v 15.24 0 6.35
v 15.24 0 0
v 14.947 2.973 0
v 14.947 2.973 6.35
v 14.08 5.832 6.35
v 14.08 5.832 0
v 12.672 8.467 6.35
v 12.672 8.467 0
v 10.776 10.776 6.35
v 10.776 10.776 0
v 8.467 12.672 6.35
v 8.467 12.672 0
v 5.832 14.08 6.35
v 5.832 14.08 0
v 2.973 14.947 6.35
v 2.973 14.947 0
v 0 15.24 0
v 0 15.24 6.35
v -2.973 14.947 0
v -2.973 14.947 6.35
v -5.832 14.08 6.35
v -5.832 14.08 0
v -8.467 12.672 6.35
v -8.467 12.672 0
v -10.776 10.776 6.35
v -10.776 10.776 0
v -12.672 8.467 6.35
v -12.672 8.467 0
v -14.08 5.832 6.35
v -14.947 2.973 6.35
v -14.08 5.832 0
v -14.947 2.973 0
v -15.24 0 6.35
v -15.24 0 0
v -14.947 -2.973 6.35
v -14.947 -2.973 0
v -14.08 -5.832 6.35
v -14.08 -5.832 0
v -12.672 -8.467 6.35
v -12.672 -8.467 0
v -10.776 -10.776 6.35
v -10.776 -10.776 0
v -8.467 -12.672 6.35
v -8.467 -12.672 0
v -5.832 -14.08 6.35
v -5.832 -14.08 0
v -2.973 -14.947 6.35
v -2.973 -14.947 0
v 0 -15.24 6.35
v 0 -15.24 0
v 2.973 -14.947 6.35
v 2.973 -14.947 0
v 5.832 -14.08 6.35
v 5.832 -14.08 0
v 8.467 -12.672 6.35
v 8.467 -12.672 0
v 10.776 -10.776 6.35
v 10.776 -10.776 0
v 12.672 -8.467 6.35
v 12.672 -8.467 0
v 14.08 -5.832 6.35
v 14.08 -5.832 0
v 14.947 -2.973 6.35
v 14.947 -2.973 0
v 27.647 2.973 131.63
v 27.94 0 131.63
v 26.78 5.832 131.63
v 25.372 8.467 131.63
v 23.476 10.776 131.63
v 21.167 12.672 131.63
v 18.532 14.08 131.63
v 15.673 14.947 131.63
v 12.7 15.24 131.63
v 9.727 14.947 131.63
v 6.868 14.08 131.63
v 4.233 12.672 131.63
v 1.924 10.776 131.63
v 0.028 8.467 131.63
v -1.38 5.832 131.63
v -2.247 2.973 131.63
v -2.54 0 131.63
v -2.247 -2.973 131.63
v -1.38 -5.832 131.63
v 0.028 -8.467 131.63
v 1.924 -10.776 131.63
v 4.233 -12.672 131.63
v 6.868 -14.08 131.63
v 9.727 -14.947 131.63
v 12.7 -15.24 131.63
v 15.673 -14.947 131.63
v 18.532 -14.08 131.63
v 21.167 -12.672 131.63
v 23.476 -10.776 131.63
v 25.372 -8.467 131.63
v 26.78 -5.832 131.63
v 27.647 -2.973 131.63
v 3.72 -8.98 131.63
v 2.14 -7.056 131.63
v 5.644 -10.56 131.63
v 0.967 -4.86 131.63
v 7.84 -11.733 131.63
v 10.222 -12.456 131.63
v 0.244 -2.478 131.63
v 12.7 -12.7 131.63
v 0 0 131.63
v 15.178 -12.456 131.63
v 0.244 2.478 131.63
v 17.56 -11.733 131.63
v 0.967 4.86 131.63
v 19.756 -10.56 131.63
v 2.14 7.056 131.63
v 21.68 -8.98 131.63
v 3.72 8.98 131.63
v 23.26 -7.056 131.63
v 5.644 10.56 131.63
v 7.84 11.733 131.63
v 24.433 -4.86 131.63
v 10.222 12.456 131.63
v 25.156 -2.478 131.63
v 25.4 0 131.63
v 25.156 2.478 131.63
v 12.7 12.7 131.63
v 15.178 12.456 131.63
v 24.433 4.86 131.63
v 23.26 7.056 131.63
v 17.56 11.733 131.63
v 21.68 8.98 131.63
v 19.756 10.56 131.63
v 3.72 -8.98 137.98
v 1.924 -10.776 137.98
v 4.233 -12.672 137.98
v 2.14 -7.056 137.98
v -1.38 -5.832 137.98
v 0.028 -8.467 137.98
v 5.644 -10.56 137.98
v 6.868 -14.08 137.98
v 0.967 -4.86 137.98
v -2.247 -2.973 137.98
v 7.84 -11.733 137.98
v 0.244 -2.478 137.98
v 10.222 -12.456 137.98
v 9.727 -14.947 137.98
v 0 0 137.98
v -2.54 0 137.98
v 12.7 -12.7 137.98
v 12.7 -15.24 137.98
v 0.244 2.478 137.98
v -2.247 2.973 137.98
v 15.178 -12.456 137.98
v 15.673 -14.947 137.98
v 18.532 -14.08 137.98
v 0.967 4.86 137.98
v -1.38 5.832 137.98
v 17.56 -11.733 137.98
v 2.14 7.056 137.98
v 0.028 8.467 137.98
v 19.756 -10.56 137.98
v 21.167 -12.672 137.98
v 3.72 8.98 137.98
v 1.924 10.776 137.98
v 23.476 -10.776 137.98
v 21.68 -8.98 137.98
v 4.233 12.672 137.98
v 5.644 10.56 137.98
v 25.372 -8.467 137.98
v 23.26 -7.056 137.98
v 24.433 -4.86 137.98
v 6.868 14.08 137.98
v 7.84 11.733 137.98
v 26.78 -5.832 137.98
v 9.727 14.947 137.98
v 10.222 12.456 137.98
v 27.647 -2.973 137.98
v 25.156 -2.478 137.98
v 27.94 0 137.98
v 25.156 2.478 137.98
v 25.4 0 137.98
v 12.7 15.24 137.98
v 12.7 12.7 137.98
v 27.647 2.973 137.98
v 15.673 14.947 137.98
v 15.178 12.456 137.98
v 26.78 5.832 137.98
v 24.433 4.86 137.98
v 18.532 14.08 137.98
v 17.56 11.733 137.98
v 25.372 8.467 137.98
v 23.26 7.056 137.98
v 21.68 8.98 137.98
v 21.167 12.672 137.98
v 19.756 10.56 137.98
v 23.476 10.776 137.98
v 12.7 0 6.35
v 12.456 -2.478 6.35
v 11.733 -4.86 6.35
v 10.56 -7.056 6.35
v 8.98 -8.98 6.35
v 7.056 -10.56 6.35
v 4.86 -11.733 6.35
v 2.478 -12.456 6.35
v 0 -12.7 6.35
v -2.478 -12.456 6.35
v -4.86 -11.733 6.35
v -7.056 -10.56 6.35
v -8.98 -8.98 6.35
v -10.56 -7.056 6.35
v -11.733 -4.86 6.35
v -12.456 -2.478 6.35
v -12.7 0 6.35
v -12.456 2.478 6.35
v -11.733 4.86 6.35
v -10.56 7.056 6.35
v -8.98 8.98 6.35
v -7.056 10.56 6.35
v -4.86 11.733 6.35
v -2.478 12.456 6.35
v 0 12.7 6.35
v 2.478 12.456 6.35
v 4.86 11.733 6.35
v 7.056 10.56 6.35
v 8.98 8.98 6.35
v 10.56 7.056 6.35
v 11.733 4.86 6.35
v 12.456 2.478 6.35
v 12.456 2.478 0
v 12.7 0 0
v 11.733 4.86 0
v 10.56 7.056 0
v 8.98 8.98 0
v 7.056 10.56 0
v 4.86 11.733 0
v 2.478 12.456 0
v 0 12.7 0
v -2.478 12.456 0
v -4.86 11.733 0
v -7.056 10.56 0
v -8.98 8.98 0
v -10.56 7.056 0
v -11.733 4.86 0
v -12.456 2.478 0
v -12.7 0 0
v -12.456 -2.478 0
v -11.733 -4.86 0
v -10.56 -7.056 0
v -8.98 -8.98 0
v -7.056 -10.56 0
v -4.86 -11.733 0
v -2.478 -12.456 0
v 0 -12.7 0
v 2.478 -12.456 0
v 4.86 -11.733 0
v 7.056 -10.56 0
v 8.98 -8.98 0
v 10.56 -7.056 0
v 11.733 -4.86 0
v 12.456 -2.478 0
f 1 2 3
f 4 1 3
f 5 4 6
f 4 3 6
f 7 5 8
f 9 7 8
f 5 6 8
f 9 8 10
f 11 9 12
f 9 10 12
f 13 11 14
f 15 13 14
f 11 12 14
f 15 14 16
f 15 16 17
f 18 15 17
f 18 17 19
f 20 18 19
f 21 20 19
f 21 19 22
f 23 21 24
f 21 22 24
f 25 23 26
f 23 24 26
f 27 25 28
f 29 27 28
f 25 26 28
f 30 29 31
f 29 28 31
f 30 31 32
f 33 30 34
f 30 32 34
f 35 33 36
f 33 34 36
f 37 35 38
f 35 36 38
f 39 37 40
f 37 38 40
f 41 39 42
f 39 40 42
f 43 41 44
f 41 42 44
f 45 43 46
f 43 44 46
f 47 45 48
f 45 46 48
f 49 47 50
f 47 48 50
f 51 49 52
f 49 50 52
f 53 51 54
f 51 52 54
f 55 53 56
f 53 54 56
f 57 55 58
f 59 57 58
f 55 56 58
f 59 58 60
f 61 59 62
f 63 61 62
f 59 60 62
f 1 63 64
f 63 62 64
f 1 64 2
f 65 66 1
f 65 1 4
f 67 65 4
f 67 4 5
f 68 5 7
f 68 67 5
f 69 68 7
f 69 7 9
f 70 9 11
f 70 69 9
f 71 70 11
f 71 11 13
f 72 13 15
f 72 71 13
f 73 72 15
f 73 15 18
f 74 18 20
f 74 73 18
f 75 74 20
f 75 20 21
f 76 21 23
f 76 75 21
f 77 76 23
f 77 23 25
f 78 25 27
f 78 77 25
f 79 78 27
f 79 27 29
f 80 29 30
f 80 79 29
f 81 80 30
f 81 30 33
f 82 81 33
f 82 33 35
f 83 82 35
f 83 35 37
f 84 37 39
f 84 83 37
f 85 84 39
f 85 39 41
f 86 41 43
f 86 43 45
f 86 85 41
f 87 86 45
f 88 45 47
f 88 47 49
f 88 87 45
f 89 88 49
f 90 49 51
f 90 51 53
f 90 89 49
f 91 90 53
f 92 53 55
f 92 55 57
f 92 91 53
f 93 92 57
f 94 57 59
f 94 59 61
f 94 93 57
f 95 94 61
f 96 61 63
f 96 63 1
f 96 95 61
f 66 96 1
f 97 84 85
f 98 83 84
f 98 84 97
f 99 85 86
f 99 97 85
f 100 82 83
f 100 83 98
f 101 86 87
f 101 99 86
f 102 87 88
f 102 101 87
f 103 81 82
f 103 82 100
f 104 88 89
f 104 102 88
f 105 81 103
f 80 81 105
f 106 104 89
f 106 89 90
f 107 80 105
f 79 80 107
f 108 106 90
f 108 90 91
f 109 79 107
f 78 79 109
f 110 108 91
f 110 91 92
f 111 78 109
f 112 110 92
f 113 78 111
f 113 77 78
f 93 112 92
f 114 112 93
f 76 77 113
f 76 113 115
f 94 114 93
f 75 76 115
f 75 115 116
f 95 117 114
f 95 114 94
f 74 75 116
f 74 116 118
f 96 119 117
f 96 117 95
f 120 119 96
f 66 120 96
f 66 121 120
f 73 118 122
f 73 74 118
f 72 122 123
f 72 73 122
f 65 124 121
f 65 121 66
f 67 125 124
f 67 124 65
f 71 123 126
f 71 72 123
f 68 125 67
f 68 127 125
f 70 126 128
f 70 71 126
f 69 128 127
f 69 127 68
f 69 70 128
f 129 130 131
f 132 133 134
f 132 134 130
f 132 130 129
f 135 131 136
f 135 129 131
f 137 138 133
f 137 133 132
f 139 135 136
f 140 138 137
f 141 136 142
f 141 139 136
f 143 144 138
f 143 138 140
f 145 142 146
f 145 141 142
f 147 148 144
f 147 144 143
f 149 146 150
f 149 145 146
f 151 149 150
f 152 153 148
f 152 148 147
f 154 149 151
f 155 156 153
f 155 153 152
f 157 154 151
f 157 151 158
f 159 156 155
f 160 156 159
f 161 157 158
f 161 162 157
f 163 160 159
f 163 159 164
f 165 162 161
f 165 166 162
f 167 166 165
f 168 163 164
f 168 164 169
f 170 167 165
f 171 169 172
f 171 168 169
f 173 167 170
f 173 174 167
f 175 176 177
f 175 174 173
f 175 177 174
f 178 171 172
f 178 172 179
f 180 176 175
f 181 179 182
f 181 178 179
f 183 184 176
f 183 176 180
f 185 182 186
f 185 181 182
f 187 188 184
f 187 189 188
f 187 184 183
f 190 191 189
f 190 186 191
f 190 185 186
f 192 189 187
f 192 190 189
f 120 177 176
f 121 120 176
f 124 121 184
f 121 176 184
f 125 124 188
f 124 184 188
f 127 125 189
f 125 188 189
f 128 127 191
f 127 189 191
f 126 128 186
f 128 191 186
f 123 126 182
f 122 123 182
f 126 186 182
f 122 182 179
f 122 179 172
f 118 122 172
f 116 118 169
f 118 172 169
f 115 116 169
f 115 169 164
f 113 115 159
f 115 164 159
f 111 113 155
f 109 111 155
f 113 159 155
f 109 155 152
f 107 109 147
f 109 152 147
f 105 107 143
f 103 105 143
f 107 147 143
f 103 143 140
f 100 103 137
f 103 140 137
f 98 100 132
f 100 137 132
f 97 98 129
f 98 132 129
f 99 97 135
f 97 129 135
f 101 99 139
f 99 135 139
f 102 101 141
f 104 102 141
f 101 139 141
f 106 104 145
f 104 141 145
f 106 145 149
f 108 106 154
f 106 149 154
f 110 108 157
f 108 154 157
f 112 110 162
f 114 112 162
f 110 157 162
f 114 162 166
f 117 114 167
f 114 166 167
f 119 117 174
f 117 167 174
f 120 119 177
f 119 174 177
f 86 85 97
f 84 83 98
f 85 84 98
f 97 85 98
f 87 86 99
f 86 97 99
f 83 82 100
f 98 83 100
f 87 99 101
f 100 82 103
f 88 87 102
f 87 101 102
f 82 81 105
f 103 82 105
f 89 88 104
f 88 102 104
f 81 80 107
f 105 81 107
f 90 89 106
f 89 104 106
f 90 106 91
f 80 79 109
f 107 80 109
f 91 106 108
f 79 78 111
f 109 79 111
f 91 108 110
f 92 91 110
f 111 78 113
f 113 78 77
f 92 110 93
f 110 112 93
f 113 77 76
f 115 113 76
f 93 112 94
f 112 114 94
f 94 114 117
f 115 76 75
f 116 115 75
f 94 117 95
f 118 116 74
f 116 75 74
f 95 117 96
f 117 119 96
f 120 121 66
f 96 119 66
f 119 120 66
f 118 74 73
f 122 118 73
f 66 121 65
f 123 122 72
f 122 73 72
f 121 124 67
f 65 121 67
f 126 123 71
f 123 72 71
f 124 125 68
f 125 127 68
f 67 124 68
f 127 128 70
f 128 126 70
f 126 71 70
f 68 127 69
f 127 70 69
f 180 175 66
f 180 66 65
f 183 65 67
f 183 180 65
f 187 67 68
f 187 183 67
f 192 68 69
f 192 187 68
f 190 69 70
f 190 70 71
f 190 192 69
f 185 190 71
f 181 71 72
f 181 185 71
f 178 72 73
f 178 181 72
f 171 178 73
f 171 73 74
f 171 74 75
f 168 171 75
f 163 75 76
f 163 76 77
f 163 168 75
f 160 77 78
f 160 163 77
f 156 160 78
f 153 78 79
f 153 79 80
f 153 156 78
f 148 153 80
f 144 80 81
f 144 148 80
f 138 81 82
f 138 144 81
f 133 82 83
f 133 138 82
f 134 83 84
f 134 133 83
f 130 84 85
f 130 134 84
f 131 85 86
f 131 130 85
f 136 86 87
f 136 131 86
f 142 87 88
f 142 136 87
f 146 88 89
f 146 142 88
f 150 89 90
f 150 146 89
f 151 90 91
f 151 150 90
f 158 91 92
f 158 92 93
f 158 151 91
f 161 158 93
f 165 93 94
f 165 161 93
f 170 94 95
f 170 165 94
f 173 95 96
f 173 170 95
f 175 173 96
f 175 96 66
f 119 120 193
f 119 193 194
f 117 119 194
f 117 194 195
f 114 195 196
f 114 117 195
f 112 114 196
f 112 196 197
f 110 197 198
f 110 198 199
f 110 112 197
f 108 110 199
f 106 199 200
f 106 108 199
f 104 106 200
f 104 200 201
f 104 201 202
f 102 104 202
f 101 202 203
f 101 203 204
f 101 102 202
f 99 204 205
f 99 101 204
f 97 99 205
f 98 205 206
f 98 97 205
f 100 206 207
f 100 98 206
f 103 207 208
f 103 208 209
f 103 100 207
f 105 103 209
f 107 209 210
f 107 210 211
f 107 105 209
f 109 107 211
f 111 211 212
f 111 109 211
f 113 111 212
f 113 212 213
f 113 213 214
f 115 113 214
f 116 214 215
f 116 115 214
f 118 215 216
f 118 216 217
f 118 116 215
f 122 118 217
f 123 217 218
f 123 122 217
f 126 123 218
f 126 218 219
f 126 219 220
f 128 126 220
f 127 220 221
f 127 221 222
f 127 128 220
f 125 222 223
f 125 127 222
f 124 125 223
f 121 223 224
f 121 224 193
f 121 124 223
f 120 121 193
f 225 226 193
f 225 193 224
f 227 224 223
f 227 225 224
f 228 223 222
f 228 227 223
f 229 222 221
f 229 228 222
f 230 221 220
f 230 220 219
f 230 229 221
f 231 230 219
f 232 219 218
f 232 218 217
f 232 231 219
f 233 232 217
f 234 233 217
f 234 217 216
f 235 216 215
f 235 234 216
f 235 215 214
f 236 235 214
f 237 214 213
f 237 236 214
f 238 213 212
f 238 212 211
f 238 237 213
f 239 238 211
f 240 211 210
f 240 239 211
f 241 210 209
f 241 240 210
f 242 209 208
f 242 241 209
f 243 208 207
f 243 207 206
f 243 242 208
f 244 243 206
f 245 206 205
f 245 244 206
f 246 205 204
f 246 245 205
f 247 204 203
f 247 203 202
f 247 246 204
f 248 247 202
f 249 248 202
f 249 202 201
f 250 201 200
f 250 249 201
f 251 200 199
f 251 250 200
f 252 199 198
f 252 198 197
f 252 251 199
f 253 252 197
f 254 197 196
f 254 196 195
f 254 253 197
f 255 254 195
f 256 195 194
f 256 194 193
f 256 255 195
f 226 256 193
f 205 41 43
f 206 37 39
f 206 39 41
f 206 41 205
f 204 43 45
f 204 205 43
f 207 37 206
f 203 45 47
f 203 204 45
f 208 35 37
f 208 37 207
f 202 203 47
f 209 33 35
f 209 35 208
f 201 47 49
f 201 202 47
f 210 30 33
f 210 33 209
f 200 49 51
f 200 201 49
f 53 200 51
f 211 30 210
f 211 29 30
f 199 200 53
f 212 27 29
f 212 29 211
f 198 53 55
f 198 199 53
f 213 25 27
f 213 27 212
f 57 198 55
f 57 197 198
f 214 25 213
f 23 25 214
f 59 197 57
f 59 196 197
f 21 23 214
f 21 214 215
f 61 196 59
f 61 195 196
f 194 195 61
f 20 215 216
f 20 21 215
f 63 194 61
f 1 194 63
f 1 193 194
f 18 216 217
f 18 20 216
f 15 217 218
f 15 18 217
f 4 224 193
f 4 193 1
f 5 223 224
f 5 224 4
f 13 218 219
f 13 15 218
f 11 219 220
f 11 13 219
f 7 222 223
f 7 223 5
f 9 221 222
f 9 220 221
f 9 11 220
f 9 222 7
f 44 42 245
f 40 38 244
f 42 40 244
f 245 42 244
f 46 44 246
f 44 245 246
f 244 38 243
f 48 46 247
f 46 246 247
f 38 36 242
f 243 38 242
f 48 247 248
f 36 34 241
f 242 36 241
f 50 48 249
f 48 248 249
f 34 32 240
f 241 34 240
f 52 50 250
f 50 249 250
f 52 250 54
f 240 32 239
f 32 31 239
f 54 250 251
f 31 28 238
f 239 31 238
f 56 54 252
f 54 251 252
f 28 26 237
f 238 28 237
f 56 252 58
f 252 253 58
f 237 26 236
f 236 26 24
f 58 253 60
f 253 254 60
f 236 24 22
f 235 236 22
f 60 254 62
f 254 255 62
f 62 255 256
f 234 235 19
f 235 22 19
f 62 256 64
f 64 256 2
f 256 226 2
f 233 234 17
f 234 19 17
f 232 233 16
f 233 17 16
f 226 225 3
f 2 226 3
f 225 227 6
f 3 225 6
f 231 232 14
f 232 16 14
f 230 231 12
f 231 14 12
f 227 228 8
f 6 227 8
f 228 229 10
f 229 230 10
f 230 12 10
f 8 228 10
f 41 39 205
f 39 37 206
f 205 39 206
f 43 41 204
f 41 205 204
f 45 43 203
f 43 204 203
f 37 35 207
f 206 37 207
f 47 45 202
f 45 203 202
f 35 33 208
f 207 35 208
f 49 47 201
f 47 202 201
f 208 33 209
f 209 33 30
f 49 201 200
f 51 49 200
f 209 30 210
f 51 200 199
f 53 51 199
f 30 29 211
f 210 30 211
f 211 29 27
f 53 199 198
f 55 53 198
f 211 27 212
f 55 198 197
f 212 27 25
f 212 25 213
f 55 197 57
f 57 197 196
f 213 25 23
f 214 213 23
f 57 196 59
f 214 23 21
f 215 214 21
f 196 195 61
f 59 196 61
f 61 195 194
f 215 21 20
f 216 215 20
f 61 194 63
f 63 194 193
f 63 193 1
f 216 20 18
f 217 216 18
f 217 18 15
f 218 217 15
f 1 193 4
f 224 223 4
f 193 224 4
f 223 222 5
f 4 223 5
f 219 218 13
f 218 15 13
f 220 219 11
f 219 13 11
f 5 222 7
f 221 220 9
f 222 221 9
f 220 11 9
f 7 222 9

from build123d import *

# Parameters (mm, degrees)
F0_R        = 15.24
F0_R_2      = 12.7
F1_DEPTH    = 6.35
F3_R        = 15.24
F3_R_2      = 12.7
F4_DEPTH    = 6.35
F1_FACE_R   = 15.24
F1_FACE_R_2 = 12.7


with BuildPart() as f1:
    # F0 (on Top) → F1 (new body)
    with BuildSketch(Plane.XY):
        Circle(F0_R)
        Circle(F0_R_2, mode=Mode.SUBTRACT)
    extrude(amount=F1_DEPTH)


with BuildPart() as f4:
    # F3 (on offset) → F4 (new body)
    with BuildSketch(Plane.XY.offset(137.980208)):
        with Locations((12.7, 0)):
            Circle(F3_R)
        with Locations((12.7, 0)):
            Circle(F3_R_2, mode=Mode.SUBTRACT)
    extrude(amount=-F4_DEPTH)


with BuildPart() as f6:
    # F6: sweep along a path in F5
    with BuildLine(Plane.XZ) as f6_path:
        Line((0, 6.35), (12.7, 131.630208))
    # F1_face (on face) → F6 (sweep)
    with BuildSketch(Plane.XY.offset(6.35)):
        Circle(F1_FACE_R)
        Circle(F1_FACE_R_2, mode=Mode.SUBTRACT)
    sweep(path=f6_path.line)


solid = Compound([f1.part, f4.part, f6.part])
